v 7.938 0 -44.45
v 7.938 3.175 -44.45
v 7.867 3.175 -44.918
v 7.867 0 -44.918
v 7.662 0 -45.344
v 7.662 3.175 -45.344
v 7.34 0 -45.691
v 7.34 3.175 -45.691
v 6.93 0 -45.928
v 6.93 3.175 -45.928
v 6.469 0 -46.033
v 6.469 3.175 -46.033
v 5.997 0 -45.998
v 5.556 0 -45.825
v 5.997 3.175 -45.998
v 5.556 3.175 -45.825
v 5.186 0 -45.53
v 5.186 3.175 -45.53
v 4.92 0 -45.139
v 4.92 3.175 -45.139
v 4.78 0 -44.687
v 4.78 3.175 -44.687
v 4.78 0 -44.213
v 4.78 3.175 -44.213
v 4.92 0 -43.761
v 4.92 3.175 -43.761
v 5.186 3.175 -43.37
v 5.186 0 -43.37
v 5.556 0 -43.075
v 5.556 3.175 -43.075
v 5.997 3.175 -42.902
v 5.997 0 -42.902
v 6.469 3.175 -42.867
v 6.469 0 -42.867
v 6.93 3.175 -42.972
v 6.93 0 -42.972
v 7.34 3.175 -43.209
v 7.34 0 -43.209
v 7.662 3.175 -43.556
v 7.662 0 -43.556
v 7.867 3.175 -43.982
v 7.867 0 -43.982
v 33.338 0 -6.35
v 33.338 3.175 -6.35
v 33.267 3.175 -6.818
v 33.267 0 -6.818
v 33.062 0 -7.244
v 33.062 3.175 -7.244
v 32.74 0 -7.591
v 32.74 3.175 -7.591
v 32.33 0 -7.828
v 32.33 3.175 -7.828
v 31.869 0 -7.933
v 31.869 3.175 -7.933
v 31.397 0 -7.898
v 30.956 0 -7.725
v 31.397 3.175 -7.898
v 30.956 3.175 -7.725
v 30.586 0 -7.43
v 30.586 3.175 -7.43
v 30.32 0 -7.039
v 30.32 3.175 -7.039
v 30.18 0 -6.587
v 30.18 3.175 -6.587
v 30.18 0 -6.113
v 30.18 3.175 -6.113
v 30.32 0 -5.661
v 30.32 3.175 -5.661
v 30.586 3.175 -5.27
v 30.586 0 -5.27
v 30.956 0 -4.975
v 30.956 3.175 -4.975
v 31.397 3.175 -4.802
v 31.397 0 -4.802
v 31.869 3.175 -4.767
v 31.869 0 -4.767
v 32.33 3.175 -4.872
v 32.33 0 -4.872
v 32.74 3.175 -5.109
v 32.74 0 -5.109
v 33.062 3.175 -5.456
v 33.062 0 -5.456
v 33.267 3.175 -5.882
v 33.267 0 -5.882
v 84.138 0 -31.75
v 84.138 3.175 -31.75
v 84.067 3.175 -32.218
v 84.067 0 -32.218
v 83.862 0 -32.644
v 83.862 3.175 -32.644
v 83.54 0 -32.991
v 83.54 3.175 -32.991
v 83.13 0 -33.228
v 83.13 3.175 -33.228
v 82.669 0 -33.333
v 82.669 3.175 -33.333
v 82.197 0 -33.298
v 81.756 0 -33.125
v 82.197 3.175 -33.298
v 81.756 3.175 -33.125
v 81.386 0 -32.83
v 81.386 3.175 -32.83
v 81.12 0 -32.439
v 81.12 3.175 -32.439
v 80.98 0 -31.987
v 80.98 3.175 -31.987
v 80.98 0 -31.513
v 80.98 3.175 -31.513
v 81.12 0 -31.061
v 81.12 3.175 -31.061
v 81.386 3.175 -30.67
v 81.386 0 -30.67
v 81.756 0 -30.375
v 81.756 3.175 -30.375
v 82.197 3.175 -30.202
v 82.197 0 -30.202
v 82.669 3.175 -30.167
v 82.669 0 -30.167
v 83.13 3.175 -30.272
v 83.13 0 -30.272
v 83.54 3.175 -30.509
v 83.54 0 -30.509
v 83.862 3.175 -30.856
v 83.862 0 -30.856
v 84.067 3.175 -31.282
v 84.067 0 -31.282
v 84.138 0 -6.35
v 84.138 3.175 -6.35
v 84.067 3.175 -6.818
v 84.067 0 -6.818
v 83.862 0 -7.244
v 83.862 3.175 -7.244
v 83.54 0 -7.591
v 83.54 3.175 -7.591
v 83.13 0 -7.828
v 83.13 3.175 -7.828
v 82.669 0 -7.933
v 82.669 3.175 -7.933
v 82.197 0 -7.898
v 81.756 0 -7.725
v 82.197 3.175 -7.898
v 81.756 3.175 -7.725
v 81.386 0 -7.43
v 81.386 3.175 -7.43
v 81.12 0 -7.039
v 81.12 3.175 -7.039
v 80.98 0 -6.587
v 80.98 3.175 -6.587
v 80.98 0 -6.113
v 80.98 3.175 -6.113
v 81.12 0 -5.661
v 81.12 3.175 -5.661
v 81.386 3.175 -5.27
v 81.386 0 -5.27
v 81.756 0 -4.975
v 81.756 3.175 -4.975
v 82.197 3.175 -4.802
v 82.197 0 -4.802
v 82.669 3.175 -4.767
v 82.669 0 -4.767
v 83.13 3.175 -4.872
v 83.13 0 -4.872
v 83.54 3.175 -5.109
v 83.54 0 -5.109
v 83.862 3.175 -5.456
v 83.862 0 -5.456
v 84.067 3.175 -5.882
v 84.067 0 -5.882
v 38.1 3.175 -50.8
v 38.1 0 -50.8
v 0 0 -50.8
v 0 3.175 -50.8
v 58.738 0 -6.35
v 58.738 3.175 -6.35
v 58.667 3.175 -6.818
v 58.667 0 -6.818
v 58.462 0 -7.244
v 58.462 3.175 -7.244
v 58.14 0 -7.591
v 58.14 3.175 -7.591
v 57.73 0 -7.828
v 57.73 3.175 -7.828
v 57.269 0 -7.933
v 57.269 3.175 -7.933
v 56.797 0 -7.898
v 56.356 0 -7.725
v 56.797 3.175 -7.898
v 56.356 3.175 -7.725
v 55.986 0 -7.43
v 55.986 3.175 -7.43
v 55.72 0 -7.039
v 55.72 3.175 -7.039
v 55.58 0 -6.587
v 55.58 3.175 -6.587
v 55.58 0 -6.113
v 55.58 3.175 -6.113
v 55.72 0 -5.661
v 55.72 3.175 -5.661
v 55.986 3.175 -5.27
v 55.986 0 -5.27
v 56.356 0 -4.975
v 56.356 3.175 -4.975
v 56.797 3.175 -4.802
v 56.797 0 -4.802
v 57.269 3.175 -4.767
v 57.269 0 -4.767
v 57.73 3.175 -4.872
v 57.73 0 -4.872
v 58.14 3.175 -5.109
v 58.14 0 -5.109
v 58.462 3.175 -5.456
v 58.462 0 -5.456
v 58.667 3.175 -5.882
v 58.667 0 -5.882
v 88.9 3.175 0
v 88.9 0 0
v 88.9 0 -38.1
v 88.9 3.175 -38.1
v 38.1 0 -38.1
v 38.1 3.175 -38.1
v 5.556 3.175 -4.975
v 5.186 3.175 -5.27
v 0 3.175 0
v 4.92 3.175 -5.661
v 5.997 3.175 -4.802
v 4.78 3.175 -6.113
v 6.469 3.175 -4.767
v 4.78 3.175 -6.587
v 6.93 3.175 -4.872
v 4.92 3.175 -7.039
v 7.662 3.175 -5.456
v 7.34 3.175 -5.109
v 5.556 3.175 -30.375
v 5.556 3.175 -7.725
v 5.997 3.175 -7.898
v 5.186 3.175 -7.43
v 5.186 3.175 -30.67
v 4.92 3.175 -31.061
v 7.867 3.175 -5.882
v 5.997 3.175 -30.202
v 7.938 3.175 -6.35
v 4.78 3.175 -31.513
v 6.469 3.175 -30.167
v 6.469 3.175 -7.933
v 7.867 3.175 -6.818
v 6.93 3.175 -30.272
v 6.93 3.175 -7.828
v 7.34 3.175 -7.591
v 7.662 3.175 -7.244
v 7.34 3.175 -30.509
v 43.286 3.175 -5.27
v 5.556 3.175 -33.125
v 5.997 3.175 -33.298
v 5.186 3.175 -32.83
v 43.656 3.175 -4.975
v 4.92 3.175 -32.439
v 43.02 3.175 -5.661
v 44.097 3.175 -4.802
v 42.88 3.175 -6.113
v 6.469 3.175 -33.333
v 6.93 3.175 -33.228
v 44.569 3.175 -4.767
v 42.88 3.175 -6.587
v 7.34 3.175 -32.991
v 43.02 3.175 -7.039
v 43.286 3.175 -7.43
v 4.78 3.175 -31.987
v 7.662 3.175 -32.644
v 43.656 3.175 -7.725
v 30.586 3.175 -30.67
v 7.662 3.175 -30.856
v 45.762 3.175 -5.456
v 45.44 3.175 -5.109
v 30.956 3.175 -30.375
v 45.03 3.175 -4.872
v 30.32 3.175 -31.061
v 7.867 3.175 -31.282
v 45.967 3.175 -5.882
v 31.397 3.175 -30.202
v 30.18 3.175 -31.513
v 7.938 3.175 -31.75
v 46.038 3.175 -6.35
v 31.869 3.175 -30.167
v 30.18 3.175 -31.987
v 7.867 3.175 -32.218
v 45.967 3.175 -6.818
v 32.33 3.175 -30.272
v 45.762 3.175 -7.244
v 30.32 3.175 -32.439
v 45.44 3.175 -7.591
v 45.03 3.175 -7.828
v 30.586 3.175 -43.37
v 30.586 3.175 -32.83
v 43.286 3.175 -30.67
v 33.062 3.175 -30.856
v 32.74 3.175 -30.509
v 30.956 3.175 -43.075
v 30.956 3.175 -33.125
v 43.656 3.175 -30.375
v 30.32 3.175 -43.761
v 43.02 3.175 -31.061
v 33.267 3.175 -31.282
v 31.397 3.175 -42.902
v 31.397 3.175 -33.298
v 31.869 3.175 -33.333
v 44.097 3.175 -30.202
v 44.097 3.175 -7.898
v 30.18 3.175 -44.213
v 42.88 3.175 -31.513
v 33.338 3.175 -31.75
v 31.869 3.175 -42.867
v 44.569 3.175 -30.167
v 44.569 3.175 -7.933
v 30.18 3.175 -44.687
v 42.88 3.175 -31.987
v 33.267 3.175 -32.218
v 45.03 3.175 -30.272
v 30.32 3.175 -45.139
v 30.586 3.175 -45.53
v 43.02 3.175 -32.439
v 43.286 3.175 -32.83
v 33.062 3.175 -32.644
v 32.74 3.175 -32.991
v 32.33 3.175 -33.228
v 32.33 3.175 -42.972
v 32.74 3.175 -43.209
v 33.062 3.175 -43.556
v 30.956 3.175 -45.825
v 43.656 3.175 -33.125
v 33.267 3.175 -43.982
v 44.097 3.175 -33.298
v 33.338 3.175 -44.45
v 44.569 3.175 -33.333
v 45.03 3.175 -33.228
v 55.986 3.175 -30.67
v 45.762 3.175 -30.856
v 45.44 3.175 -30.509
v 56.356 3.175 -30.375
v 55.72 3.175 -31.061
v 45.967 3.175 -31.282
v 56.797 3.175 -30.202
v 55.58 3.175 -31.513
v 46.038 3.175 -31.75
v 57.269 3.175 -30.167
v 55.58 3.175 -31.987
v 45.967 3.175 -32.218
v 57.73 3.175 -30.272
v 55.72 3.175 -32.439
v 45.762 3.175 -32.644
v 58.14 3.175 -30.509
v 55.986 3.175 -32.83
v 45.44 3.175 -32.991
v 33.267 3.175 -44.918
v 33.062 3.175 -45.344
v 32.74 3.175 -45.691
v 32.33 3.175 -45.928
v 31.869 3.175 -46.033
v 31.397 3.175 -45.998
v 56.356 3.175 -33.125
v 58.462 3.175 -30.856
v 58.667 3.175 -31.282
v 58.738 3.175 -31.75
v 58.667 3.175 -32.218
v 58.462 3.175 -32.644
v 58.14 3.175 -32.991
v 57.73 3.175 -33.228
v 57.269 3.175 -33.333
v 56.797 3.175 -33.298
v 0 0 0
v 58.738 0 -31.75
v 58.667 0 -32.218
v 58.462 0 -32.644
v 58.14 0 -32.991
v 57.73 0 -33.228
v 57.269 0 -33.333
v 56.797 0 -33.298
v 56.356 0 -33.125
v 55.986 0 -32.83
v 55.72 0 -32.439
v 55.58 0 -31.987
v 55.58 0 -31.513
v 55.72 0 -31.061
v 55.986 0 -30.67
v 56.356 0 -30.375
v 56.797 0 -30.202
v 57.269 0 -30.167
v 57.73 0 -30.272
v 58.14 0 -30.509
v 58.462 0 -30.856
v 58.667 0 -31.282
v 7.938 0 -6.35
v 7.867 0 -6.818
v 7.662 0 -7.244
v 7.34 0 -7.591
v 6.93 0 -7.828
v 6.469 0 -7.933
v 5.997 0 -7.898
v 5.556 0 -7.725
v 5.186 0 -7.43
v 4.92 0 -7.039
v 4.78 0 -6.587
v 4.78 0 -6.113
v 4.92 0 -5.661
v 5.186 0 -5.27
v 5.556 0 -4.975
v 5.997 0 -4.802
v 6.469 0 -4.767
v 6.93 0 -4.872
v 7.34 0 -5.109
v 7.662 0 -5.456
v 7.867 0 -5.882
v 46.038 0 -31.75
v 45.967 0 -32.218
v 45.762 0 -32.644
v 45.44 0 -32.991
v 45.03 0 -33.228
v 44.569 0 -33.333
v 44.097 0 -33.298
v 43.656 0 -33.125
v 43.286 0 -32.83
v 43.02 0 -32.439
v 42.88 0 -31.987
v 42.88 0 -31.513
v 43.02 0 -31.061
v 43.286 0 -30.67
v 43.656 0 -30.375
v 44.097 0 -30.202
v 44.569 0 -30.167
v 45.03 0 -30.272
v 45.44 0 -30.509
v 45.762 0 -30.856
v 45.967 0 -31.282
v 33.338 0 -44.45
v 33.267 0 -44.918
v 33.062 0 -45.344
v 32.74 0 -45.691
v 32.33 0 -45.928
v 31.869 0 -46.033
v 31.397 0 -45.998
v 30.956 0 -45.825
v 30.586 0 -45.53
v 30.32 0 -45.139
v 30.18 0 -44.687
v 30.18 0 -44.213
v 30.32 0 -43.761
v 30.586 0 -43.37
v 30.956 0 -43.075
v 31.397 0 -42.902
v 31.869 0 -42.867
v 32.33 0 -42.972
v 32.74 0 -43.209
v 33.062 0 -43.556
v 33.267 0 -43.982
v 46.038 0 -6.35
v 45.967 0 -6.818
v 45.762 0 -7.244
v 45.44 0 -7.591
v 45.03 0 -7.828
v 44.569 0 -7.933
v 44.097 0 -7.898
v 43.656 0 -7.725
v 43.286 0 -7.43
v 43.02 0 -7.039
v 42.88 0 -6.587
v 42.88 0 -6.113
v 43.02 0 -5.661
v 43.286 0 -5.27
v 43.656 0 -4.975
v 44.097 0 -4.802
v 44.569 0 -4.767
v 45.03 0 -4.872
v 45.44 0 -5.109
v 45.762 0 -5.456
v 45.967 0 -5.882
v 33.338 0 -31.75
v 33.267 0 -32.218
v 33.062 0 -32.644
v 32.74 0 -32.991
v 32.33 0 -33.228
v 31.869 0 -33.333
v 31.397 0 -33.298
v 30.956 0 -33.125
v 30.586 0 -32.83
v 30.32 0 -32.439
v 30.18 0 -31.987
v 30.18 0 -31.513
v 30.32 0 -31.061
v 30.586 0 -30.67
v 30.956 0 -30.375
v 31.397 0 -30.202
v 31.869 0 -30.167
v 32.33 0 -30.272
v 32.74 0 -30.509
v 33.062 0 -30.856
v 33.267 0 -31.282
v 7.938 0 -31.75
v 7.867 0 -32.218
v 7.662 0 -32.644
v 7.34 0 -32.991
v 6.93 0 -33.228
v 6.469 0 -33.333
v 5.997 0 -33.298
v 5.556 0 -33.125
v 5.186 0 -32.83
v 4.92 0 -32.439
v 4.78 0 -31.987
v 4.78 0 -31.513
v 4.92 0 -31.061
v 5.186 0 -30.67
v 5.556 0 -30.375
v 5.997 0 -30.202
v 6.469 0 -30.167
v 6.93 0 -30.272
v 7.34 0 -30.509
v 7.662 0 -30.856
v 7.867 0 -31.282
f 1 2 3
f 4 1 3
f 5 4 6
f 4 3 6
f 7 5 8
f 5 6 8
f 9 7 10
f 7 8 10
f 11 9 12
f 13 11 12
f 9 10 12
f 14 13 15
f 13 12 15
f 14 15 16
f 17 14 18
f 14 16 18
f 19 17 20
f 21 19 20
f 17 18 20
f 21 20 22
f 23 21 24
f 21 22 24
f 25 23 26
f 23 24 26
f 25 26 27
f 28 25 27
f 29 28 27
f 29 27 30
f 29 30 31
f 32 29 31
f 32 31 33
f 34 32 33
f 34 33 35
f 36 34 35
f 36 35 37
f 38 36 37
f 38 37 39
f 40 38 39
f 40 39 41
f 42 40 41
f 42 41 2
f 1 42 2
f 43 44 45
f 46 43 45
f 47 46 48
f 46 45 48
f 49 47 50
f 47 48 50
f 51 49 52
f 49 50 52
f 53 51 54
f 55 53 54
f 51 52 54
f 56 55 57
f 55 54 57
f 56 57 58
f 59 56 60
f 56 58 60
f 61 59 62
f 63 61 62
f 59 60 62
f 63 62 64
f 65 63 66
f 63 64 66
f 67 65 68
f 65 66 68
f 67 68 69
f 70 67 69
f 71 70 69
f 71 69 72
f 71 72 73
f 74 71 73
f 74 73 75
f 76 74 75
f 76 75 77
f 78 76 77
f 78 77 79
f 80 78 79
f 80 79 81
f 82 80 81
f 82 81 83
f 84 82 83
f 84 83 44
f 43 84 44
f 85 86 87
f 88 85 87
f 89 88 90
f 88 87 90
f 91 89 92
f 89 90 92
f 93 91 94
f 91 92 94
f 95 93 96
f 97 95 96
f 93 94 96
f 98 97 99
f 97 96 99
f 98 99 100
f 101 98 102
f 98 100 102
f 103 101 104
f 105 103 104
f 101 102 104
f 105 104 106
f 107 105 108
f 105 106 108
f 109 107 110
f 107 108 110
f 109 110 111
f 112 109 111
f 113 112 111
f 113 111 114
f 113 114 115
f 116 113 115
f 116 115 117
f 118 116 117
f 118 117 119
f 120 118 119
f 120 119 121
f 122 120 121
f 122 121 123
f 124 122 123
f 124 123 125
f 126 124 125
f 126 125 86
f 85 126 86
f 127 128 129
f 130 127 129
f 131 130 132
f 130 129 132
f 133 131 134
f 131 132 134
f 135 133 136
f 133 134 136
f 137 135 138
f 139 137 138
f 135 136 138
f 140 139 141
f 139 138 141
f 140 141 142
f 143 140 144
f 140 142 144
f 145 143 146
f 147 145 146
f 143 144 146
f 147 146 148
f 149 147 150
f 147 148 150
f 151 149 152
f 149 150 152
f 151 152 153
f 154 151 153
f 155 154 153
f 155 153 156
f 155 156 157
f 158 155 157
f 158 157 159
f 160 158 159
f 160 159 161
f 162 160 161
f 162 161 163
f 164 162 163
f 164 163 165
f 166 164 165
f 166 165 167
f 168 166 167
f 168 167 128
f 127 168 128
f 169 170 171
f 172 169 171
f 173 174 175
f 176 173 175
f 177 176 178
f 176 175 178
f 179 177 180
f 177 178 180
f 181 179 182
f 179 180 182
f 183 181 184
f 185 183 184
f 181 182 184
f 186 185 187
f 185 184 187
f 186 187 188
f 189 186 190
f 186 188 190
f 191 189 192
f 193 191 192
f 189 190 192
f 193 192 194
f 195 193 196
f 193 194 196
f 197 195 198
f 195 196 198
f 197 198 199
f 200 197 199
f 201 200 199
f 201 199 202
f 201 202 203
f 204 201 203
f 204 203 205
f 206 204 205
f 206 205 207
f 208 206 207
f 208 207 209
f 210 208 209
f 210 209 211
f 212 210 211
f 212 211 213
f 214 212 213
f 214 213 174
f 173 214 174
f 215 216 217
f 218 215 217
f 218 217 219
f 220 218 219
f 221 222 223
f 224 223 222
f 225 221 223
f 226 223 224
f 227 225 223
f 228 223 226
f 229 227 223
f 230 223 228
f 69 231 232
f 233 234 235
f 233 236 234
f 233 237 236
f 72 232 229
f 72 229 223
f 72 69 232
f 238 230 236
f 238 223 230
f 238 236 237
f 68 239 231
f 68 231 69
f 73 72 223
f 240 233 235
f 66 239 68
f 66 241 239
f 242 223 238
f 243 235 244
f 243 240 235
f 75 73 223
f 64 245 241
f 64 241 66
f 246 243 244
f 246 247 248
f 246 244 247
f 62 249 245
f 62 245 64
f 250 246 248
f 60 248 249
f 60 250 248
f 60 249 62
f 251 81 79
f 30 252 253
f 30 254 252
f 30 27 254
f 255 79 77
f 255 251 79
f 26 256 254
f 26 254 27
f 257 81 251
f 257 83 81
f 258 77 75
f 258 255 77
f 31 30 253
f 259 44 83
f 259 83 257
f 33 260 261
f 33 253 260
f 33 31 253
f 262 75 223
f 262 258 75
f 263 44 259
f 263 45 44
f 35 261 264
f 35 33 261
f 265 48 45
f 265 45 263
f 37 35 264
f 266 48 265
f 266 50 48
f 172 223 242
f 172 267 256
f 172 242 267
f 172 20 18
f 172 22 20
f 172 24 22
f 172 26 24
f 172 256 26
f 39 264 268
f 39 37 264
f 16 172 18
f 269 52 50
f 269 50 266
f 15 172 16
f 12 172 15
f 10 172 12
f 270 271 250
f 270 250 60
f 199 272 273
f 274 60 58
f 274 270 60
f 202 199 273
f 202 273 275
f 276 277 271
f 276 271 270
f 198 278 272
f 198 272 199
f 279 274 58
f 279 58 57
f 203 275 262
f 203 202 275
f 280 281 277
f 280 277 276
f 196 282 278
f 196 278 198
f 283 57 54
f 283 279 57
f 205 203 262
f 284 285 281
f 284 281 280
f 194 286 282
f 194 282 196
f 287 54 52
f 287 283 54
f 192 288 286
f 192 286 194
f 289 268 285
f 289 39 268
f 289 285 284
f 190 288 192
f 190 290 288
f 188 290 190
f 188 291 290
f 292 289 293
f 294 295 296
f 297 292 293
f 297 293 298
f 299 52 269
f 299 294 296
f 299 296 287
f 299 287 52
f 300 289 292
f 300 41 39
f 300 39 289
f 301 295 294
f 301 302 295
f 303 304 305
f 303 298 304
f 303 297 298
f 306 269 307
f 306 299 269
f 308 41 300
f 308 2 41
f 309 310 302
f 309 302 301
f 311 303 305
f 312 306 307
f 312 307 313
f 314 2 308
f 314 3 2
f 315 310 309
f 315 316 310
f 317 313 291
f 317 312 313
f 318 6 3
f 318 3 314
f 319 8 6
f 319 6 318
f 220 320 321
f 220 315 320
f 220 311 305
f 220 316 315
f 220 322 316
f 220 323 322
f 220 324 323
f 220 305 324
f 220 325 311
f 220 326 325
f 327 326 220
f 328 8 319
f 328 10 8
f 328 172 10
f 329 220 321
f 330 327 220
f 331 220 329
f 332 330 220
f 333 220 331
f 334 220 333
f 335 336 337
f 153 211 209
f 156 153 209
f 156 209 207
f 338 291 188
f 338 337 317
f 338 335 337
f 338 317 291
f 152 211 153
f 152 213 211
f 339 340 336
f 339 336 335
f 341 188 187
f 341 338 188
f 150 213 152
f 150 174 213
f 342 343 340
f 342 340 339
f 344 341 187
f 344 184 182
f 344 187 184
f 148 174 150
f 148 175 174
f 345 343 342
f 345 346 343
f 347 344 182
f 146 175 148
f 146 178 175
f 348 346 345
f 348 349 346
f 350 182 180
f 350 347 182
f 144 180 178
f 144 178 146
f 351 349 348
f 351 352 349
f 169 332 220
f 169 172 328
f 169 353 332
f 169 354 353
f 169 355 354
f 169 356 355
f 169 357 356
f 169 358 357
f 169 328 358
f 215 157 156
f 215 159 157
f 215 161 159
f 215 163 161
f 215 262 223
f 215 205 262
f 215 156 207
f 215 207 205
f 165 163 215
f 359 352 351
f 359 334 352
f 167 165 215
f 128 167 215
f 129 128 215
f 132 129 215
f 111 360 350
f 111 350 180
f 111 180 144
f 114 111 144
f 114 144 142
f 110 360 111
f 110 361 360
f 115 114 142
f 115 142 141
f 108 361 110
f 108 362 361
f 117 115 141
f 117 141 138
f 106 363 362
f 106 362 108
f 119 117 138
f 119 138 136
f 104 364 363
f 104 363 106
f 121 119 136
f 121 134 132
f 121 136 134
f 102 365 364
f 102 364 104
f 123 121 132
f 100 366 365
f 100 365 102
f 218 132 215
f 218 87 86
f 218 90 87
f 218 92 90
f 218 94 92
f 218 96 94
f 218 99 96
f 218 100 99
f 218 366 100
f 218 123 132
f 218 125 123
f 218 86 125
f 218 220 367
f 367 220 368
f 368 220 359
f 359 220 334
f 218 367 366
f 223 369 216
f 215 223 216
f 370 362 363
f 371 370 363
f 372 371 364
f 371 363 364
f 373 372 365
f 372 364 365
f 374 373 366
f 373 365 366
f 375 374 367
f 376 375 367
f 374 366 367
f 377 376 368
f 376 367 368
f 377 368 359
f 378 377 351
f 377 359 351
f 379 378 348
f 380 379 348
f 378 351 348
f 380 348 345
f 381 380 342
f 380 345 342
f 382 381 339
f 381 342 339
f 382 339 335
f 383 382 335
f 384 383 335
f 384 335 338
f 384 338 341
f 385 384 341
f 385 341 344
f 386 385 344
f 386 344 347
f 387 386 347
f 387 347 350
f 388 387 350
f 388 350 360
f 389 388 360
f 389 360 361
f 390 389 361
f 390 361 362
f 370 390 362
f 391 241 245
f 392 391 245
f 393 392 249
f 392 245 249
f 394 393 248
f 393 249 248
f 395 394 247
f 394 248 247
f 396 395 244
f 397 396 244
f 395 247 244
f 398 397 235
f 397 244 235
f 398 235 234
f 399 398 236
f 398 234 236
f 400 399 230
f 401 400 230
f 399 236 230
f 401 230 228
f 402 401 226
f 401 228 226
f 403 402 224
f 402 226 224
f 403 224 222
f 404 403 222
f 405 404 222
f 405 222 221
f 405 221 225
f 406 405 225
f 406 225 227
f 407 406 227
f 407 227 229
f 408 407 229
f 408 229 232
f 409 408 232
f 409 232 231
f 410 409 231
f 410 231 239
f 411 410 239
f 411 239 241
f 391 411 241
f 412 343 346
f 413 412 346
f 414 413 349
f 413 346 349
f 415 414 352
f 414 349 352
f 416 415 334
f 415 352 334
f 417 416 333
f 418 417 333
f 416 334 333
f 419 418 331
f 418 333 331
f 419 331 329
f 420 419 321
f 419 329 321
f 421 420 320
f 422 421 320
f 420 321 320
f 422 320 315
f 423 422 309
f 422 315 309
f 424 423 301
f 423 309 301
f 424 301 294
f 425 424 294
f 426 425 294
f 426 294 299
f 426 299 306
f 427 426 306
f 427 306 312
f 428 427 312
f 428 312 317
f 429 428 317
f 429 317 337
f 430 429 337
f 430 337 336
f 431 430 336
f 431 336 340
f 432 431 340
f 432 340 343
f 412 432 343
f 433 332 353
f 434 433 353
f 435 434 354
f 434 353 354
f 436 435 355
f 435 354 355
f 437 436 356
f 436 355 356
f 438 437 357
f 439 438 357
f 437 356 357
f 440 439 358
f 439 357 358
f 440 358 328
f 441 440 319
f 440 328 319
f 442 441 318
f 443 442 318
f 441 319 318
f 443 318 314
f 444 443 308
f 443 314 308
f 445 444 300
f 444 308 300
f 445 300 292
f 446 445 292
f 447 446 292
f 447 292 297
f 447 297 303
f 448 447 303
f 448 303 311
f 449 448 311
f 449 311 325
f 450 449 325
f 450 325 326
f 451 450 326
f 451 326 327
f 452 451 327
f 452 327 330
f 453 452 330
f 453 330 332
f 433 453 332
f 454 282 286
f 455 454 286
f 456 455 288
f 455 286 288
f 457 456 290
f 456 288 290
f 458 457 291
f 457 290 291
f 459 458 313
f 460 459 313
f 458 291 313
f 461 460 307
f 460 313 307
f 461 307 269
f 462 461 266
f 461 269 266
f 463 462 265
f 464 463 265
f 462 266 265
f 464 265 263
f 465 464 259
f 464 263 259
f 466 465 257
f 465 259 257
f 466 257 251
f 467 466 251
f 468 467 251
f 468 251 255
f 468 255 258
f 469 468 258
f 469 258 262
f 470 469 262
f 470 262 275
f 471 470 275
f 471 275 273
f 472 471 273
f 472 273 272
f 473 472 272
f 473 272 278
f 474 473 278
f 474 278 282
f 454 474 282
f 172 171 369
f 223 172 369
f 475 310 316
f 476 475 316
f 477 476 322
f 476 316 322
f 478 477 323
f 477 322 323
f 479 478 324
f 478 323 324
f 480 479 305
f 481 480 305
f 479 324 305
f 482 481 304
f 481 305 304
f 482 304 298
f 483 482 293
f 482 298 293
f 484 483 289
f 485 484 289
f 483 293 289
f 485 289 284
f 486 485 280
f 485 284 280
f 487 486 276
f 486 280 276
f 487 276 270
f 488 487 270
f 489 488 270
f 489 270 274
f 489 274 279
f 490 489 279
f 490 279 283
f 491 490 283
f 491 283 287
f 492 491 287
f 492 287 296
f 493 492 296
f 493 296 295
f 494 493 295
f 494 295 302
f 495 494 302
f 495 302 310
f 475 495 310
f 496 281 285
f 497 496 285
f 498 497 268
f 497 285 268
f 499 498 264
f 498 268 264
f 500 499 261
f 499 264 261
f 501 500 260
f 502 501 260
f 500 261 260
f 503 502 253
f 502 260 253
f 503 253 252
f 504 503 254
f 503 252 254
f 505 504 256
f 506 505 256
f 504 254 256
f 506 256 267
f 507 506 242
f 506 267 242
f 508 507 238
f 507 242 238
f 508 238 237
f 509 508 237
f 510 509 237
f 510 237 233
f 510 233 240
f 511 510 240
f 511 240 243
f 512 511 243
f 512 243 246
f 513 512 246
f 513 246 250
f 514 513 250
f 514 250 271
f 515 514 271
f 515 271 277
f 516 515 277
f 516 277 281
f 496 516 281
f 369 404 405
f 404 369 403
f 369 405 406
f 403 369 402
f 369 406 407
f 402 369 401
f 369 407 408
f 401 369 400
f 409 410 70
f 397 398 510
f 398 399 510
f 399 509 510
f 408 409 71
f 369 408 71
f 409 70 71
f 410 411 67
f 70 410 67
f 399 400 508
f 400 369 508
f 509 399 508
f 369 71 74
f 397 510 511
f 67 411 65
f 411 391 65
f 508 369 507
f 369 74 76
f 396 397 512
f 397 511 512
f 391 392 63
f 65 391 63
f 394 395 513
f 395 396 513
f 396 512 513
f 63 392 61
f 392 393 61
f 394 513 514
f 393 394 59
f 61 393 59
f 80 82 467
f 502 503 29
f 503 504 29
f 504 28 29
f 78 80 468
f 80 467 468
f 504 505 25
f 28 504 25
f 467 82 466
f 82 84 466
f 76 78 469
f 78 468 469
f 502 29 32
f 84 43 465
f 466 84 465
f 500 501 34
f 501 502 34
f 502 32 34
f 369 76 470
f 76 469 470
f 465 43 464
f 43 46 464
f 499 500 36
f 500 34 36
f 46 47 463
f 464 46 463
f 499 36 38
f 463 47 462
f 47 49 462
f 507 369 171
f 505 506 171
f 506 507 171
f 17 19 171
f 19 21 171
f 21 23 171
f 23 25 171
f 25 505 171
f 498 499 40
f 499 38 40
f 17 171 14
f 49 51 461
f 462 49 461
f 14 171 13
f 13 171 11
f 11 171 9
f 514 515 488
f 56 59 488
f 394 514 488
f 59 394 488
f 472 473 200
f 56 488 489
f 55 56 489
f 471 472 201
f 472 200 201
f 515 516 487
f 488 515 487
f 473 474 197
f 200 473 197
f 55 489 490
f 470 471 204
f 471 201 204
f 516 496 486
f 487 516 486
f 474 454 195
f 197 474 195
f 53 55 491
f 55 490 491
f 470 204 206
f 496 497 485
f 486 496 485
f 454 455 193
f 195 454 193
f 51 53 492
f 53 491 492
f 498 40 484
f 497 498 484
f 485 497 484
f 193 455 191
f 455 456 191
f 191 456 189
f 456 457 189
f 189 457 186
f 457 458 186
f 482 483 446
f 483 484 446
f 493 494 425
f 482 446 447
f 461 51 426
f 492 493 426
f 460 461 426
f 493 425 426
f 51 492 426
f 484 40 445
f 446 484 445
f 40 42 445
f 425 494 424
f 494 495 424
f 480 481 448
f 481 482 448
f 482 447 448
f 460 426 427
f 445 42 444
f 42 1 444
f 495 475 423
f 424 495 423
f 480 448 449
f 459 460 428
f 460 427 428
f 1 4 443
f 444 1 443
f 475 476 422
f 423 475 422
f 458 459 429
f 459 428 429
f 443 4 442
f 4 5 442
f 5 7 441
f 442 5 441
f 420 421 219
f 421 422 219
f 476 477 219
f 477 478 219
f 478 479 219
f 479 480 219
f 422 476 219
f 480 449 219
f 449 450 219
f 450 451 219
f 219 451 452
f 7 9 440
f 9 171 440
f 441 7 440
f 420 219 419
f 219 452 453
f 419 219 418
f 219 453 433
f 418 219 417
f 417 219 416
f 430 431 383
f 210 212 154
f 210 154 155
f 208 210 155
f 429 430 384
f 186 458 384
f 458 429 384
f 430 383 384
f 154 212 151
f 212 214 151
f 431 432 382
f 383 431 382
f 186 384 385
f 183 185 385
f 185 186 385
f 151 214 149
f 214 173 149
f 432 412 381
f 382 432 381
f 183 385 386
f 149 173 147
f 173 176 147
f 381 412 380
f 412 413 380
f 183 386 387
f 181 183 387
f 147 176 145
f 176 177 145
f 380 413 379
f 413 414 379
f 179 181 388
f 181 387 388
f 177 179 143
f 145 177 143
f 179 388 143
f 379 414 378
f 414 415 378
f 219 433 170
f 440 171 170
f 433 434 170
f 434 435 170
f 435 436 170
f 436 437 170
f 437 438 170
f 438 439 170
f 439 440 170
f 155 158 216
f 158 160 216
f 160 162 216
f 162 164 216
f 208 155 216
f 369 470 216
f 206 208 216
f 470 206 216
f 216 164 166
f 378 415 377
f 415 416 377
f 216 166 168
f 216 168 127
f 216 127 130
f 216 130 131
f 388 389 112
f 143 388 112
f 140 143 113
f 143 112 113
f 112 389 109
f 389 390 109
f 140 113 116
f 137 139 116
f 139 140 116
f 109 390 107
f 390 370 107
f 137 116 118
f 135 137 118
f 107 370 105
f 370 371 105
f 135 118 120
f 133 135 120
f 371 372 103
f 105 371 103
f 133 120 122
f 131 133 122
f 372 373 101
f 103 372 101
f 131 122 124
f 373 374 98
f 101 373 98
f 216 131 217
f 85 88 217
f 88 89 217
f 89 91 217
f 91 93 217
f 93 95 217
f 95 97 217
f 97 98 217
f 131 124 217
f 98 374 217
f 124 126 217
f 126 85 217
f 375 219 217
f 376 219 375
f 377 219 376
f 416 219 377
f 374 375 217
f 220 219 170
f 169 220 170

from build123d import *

# Parameters (mm, degrees)
BOSS_EXTRUDE1_DEPTH = 3.175
SKETCH2_R           = 1.5875
CUT_EXTRUDE1_DEPTH  = 4.175


with BuildPart() as part:
    # Sketch1 → Boss-Extrude1 (new body)
    with BuildSketch(Plane(origin=(0, 0, 0), x_dir=(1, 0, 0), z_dir=(0, 1, 0))):
        Polygon((0, 50.8), (0, 0), (88.9, 0), (88.9, 38.1), (38.1, 38.1), (38.1, 50.8), align=None)
    extrude(amount=BOSS_EXTRUDE1_DEPTH)

    # Sketch2 → Cut-Extrude1 (cut, through all)
    with BuildSketch(Plane(origin=(0, 3.175, 0), x_dir=(1, 0, 0), z_dir=(0, 1, 0))):
        with Locations((6.35, 44.45)):
            Circle(SKETCH2_R)
        with Locations((31.75, 44.45)):
            Circle(SKETCH2_R)
        with Locations((31.75, 31.75)):
            Circle(SKETCH2_R)
        with Locations((6.35, 31.75)):
            Circle(SKETCH2_R)
        with Locations((6.35, 6.35)):
            Circle(SKETCH2_R)
        with Locations((31.75, 6.35)):
            Circle(SKETCH2_R)
        with Locations((82.55, 6.35)):
            Circle(SKETCH2_R)
        with Locations((82.55, 31.75)):
            Circle(SKETCH2_R)
        with Locations((57.15, 31.75)):
            Circle(SKETCH2_R)
        with Locations((57.15, 6.35)):
            Circle(SKETCH2_R)
        with Locations((44.45, 6.35)):
            Circle(SKETCH2_R)
        with Locations((44.45, 31.75)):
            Circle(SKETCH2_R)
    extrude(amount=-CUT_EXTRUDE1_DEPTH, mode=Mode.SUBTRACT)


solid = part.part
